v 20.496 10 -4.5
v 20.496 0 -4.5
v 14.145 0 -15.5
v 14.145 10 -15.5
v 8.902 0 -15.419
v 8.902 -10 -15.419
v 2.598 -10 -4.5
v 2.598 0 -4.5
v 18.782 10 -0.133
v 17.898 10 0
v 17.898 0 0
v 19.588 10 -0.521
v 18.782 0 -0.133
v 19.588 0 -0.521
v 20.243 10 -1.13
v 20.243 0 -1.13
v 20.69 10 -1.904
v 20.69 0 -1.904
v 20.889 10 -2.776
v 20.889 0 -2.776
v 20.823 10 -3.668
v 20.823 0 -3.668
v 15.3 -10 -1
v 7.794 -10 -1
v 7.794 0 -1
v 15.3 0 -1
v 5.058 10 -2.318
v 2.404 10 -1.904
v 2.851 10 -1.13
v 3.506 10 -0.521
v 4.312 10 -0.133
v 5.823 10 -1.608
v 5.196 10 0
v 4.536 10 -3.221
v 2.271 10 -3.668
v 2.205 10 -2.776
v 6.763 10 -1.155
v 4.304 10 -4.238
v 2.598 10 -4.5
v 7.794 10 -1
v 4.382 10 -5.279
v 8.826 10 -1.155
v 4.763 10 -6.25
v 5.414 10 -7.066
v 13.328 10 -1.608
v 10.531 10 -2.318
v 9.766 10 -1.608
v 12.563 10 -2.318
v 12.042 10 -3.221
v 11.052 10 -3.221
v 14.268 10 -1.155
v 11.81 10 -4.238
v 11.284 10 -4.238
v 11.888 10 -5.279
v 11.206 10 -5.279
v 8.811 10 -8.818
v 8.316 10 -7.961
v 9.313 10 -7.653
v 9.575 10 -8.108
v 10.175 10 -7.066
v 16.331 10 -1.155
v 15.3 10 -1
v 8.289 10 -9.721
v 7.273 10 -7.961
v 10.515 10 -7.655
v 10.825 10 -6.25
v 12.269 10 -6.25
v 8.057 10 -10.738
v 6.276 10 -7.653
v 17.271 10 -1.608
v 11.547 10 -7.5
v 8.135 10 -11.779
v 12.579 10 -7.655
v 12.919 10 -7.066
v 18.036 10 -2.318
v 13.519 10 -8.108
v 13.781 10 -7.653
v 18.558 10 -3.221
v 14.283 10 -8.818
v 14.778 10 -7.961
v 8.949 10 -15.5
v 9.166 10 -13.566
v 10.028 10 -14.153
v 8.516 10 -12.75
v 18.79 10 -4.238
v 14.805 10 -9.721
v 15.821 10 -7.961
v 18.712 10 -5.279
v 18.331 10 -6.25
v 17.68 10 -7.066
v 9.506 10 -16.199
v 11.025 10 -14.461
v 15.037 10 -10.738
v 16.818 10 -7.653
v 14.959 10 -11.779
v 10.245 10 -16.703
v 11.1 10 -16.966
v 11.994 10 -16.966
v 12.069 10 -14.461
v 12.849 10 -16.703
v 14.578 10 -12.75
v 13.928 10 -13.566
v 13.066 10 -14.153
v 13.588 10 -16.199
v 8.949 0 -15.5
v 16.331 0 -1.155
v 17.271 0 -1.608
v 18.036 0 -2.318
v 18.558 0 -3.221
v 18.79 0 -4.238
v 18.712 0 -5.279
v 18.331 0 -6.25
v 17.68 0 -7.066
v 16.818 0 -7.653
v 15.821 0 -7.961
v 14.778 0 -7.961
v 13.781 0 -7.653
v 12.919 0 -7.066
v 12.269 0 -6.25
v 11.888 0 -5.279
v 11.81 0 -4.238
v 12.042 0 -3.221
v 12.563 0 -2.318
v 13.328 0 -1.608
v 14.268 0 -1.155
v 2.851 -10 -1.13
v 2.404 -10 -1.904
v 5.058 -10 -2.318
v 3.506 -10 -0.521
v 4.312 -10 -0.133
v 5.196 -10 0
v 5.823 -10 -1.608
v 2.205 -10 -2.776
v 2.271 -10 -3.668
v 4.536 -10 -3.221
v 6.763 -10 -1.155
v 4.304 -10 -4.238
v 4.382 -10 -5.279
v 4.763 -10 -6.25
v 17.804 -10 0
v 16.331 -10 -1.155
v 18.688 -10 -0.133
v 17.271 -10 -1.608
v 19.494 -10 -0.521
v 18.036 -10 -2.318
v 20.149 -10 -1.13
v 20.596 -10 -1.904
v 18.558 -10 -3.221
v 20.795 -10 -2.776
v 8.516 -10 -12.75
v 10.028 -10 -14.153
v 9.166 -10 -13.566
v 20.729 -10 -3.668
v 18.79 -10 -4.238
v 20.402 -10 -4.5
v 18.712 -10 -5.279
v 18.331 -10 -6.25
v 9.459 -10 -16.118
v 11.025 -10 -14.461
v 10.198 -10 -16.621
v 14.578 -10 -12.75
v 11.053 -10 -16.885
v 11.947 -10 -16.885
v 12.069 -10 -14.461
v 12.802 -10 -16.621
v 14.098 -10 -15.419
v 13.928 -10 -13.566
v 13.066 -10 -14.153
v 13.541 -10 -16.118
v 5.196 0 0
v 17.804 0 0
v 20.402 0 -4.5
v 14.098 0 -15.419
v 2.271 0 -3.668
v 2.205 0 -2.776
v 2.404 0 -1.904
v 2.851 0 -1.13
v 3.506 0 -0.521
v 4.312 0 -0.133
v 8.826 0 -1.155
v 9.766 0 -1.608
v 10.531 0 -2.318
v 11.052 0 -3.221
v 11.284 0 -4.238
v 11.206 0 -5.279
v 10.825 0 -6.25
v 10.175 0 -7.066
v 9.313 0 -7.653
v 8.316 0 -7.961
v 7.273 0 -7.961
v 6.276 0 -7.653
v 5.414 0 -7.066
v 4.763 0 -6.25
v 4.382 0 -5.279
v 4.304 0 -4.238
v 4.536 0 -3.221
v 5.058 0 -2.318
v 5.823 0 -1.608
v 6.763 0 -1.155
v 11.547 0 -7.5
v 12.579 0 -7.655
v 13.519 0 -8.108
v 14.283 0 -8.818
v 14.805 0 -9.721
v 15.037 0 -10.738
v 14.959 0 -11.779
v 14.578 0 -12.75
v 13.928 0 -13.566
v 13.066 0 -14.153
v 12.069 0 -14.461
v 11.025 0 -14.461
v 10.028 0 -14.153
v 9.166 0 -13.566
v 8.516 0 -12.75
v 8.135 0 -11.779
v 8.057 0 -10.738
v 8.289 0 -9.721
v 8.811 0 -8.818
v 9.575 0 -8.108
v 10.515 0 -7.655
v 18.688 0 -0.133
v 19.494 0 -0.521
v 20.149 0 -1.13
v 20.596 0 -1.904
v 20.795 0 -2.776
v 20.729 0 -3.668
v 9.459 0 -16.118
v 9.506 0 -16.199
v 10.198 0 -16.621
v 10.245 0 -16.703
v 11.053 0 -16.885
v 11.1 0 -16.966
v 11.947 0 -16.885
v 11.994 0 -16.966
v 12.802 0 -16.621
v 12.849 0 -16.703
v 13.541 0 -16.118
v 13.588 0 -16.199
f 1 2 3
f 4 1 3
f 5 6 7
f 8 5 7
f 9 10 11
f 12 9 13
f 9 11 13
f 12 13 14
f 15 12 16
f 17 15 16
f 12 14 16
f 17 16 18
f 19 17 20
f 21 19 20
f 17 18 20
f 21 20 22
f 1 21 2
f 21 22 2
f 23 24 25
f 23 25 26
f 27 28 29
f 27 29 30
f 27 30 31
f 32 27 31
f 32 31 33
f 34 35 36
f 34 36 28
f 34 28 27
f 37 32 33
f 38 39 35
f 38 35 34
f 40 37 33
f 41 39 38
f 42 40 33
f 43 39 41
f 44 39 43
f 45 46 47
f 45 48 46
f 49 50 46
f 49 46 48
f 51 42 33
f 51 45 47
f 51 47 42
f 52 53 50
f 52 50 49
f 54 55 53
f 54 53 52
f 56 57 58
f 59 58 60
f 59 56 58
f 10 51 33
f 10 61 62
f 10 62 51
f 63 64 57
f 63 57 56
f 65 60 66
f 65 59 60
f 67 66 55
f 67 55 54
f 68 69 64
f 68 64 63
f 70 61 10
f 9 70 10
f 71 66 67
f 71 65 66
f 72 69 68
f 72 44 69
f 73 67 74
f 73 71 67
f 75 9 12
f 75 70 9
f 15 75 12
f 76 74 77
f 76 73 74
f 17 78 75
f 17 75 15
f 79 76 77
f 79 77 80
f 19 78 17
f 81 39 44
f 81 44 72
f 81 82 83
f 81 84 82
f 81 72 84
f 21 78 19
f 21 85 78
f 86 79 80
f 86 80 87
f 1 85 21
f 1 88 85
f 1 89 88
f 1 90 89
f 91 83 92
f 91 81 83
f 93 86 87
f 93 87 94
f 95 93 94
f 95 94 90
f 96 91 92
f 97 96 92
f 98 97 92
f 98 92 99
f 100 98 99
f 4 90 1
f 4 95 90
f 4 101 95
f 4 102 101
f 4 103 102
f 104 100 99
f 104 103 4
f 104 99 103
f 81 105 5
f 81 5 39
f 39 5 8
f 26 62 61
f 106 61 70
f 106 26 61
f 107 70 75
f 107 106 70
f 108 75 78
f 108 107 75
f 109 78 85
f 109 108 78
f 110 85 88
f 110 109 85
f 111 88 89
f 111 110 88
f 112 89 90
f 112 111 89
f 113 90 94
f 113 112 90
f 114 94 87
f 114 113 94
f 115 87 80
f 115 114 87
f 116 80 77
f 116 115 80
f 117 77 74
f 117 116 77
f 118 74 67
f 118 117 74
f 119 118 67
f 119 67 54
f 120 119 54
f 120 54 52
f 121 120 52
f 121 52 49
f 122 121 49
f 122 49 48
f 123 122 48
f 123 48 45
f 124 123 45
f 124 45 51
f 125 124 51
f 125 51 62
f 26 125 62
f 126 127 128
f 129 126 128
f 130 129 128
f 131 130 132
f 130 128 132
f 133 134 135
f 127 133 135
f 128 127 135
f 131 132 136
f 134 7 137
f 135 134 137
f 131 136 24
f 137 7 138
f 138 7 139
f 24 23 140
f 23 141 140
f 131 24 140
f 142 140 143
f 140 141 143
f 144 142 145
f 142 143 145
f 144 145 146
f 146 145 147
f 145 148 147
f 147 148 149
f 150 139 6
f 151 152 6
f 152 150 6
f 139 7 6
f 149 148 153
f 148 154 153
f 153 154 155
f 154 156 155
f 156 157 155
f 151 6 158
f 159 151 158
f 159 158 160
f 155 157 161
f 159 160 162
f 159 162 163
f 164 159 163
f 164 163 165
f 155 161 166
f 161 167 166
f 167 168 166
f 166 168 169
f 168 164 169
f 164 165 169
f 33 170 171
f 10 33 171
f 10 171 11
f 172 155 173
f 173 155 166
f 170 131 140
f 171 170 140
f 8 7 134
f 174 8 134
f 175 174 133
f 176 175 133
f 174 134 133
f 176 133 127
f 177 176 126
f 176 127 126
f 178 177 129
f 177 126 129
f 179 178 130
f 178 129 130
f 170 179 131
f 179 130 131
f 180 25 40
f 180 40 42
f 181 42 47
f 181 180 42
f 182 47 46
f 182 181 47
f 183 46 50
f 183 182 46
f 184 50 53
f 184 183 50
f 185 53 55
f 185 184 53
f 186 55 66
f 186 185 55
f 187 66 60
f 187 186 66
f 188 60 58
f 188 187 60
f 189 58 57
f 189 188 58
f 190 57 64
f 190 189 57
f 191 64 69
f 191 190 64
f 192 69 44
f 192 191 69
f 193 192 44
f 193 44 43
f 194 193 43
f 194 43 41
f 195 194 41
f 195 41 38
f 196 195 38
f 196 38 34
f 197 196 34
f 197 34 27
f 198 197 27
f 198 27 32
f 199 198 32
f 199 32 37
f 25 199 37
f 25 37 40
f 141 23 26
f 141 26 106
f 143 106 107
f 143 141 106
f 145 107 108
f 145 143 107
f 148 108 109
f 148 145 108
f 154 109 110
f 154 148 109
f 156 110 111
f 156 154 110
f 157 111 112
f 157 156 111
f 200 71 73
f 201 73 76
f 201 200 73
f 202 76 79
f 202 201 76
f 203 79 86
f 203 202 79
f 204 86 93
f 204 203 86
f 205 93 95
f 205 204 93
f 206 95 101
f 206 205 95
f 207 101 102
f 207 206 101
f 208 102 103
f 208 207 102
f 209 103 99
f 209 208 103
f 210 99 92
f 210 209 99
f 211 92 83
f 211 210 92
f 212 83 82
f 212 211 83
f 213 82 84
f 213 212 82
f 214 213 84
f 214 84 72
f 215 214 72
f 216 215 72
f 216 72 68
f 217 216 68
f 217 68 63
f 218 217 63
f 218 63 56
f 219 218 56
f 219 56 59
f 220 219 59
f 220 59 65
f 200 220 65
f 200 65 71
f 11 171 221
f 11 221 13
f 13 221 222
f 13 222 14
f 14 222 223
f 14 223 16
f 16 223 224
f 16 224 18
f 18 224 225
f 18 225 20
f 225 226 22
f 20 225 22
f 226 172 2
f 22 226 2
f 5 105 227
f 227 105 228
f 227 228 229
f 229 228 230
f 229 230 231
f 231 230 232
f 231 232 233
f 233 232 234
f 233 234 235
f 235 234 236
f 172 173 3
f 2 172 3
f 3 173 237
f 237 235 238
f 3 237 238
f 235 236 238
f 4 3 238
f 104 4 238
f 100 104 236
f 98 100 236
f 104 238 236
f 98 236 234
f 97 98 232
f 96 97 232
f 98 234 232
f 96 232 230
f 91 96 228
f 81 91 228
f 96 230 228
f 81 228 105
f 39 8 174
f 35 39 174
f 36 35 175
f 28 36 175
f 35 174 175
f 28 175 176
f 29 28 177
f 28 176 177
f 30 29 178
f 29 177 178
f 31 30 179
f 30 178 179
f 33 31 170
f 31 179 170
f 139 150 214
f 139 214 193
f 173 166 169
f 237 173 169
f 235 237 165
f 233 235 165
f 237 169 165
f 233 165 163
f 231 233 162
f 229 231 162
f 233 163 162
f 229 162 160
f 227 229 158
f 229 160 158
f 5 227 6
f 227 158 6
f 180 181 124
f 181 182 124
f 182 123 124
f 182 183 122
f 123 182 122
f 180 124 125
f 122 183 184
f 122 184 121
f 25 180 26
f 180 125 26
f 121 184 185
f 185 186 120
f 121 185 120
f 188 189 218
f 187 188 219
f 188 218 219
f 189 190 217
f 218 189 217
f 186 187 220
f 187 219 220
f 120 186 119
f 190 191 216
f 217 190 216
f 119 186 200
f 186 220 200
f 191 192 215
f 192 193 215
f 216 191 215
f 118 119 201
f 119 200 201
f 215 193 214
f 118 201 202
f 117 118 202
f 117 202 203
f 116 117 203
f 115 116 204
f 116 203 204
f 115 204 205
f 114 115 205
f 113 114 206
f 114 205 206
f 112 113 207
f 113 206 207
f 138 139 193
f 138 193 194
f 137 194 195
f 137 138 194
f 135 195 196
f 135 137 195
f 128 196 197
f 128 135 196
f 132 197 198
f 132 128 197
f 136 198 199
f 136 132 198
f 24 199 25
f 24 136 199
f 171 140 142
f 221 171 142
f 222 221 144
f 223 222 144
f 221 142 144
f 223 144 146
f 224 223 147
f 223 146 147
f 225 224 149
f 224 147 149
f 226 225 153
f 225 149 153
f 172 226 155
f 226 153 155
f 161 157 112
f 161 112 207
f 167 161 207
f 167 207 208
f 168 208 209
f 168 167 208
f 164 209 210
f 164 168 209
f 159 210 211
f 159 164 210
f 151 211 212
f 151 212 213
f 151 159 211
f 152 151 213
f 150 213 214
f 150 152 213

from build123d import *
from build123d.topology import SkipClean

# Parameters (mm, degrees)
SKETCH_1_R      = 3.5
EXTRUDE_1_DEPTH = 10
EXTRUDE_START   = 10
EXTRUDE_2_DEPTH = 10


with BuildPart() as part:
    # Эскиз1 → Бобышка-Вытянуть1 (new body)
    with BuildSketch(Plane(origin=(0, 0, 0), x_dir=(1, 0, 0), z_dir=(0, 1, 0))):
        with BuildLine():
            Line((5.196152423, 0), (17.897858345, 0))
            ThreePointArc((17.897858345, 0), (20.495934556, 1.5), (20.495934556, 4.5))
            Line((20.495934556, 4.5), (14.145081595, 15.5))
            ThreePointArc((14.145081595, 15.5), (11.547005384, 17), (8.948929172, 15.5))
            Line((8.948929172, 15.5), (2.598076211, 4.5))
            ThreePointArc((2.598076211, 4.5), (2.598076211, 1.5), (5.196152423, 0))
        make_face()
        with Locations(Location((15.299782134, 4.5, 0), (0, 0, 270))):
            Circle(SKETCH_1_R, mode=Mode.SUBTRACT)
        with Locations(Location((11.547005384, 11, 0), (0, 0, 270))):
            Circle(SKETCH_1_R, mode=Mode.SUBTRACT)
        with Locations(Location((7.794228634, 4.5, 0), (0, 0, 270))):
            Circle(SKETCH_1_R, mode=Mode.SUBTRACT)
    extrude(amount=EXTRUDE_1_DEPTH)

    # Эскиз4 → Бобышка-Вытянуть2 (add)
    with SkipClean():  # the faces are left unmerged after this step: merging them gives an invalid solid
        with BuildSketch(Plane(origin=(0, 0, 0), x_dir=(-1, 0, 0), z_dir=(0, -1, 0)).offset(EXTRUDE_START)):
            with BuildLine():
                Line((-5.196152423, 0), (-17.803847577, 0))
                ThreePointArc((-17.803847577, 0), (-20.401923789, 1.5), (-20.401923789, 4.5))
                Line((-20.401923789, 4.5), (-14.098076211, 15.418584287))
                ThreePointArc((-14.098076211, 15.418584287), (-11.5, 16.918584287), (-8.901923789, 15.418584287))
                Line((-8.901923789, 15.418584287), (-2.598076211, 4.5))
                ThreePointArc((-2.598076211, 4.5), (-2.598076211, 1.5), (-5.196152423, 0))
            make_face()
            with BuildLine():
                Line((-7.794228634, 1), (-15.299782134, 1))
                ThreePointArc((-15.299782134, 1), (-18.330871047, 2.75), (-18.330871047, 6.25))
                Line((-18.330871047, 6.25), (-14.578094297, 12.75))
                ThreePointArc((-14.578094297, 12.75), (-11.547005384, 14.5), (-8.515916471, 12.75))
                Line((-8.515916471, 12.75), (-4.763139721, 6.25))
                ThreePointArc((-4.763139721, 6.25), (-4.763139721, 2.75), (-7.794228634, 1))
            make_face(mode=Mode.SUBTRACT)
        extrude(amount=-EXTRUDE_2_DEPTH)


solid = part.part
